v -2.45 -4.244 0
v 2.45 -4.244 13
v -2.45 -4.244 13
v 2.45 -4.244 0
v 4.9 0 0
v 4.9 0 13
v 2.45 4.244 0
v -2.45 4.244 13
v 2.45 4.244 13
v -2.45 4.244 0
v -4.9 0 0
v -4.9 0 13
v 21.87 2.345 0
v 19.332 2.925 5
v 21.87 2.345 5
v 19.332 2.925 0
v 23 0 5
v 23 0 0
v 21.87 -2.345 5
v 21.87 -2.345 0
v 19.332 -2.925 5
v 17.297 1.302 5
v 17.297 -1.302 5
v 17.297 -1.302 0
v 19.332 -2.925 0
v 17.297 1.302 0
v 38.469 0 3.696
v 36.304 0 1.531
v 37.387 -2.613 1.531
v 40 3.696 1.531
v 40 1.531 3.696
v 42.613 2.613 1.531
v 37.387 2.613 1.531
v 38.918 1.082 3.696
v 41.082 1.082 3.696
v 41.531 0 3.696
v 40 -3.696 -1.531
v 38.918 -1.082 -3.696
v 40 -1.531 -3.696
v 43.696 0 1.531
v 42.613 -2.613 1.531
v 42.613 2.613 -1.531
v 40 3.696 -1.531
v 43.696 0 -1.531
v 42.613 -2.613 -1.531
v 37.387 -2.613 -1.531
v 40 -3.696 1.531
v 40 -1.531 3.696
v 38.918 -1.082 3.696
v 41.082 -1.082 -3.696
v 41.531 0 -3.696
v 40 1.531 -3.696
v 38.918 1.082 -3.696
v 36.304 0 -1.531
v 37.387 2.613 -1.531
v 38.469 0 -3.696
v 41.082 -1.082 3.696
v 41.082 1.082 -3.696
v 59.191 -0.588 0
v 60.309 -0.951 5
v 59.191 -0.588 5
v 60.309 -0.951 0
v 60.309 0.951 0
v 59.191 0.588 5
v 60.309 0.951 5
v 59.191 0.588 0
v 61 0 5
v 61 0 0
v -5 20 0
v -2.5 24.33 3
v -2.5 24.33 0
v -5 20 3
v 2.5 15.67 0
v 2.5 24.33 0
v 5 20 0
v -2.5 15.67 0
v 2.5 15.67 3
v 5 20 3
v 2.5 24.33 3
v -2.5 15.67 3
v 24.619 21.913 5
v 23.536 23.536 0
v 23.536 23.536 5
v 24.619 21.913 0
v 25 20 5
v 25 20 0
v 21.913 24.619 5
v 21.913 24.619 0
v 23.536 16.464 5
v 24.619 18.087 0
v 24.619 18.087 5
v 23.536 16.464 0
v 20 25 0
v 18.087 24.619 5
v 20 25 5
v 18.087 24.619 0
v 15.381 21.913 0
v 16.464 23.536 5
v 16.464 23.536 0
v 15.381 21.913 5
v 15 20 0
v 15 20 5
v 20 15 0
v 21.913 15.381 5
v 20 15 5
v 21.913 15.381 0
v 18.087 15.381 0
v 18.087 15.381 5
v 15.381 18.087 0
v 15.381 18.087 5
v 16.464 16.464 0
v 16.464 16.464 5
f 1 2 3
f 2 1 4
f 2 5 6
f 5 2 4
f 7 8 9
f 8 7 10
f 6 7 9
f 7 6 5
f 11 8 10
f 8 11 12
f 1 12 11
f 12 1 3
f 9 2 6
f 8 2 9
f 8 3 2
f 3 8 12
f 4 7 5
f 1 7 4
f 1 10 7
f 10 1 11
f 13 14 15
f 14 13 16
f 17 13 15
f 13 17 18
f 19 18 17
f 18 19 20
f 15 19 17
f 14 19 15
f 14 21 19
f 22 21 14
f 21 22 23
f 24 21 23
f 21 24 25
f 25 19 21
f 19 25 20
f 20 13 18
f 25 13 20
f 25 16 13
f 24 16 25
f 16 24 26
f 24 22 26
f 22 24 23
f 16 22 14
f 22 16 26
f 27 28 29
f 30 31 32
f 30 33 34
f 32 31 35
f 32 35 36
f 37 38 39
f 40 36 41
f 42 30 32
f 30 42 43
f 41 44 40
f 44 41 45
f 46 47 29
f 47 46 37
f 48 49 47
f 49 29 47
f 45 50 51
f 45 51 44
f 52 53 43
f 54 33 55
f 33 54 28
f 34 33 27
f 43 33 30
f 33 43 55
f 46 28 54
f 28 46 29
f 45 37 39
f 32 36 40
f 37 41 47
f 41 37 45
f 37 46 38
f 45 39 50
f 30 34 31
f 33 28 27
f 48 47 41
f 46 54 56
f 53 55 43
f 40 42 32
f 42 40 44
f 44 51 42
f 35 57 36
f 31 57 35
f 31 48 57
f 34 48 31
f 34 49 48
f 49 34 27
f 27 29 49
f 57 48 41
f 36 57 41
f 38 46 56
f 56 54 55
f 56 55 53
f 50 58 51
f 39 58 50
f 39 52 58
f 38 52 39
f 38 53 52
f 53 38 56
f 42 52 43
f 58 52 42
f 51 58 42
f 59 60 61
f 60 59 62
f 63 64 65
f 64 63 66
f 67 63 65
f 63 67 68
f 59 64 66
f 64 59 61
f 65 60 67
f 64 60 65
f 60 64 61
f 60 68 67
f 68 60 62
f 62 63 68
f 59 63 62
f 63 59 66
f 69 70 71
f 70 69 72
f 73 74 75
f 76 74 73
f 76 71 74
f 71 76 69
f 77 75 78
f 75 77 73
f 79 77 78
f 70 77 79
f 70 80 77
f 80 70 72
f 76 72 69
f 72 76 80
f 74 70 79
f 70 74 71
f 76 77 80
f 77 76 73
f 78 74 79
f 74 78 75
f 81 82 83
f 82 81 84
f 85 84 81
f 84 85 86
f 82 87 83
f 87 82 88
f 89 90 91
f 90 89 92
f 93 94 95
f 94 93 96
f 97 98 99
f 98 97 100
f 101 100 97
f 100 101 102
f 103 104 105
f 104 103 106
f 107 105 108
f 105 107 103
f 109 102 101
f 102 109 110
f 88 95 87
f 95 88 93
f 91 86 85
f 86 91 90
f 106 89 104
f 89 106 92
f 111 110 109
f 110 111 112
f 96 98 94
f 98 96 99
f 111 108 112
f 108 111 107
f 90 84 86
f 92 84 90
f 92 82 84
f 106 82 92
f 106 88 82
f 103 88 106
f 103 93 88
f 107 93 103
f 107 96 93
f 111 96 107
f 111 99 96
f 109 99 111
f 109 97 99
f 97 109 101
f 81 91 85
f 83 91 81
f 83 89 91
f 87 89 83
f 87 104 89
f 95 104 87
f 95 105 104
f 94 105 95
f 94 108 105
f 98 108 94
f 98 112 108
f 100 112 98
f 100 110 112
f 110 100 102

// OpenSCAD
// Faceting requested through $fa/$fs instead of $fn.
cylinder(d = 9.8, h = 13, $fa = 70);                          // 6 segments
translate([20, 0, 0]) cylinder(r = 3, h = 5, $fs = 3);         // 7 segments
translate([40, 0, 0]) sphere(r = 4, $fa = 45);                 // 8 segments, mesh fallback
translate([60, 0, 0]) cylinder(r = 1, h = 5);                  // default fineness: exact
translate([0, 20, 0]) linear_extrude(3) circle(r = 5, $fa = 60);  // hexagon prism
translate([20, 20, 0]) cylinder(r = 5, h = 5, $fa = 1);        // 16 segments: exact
